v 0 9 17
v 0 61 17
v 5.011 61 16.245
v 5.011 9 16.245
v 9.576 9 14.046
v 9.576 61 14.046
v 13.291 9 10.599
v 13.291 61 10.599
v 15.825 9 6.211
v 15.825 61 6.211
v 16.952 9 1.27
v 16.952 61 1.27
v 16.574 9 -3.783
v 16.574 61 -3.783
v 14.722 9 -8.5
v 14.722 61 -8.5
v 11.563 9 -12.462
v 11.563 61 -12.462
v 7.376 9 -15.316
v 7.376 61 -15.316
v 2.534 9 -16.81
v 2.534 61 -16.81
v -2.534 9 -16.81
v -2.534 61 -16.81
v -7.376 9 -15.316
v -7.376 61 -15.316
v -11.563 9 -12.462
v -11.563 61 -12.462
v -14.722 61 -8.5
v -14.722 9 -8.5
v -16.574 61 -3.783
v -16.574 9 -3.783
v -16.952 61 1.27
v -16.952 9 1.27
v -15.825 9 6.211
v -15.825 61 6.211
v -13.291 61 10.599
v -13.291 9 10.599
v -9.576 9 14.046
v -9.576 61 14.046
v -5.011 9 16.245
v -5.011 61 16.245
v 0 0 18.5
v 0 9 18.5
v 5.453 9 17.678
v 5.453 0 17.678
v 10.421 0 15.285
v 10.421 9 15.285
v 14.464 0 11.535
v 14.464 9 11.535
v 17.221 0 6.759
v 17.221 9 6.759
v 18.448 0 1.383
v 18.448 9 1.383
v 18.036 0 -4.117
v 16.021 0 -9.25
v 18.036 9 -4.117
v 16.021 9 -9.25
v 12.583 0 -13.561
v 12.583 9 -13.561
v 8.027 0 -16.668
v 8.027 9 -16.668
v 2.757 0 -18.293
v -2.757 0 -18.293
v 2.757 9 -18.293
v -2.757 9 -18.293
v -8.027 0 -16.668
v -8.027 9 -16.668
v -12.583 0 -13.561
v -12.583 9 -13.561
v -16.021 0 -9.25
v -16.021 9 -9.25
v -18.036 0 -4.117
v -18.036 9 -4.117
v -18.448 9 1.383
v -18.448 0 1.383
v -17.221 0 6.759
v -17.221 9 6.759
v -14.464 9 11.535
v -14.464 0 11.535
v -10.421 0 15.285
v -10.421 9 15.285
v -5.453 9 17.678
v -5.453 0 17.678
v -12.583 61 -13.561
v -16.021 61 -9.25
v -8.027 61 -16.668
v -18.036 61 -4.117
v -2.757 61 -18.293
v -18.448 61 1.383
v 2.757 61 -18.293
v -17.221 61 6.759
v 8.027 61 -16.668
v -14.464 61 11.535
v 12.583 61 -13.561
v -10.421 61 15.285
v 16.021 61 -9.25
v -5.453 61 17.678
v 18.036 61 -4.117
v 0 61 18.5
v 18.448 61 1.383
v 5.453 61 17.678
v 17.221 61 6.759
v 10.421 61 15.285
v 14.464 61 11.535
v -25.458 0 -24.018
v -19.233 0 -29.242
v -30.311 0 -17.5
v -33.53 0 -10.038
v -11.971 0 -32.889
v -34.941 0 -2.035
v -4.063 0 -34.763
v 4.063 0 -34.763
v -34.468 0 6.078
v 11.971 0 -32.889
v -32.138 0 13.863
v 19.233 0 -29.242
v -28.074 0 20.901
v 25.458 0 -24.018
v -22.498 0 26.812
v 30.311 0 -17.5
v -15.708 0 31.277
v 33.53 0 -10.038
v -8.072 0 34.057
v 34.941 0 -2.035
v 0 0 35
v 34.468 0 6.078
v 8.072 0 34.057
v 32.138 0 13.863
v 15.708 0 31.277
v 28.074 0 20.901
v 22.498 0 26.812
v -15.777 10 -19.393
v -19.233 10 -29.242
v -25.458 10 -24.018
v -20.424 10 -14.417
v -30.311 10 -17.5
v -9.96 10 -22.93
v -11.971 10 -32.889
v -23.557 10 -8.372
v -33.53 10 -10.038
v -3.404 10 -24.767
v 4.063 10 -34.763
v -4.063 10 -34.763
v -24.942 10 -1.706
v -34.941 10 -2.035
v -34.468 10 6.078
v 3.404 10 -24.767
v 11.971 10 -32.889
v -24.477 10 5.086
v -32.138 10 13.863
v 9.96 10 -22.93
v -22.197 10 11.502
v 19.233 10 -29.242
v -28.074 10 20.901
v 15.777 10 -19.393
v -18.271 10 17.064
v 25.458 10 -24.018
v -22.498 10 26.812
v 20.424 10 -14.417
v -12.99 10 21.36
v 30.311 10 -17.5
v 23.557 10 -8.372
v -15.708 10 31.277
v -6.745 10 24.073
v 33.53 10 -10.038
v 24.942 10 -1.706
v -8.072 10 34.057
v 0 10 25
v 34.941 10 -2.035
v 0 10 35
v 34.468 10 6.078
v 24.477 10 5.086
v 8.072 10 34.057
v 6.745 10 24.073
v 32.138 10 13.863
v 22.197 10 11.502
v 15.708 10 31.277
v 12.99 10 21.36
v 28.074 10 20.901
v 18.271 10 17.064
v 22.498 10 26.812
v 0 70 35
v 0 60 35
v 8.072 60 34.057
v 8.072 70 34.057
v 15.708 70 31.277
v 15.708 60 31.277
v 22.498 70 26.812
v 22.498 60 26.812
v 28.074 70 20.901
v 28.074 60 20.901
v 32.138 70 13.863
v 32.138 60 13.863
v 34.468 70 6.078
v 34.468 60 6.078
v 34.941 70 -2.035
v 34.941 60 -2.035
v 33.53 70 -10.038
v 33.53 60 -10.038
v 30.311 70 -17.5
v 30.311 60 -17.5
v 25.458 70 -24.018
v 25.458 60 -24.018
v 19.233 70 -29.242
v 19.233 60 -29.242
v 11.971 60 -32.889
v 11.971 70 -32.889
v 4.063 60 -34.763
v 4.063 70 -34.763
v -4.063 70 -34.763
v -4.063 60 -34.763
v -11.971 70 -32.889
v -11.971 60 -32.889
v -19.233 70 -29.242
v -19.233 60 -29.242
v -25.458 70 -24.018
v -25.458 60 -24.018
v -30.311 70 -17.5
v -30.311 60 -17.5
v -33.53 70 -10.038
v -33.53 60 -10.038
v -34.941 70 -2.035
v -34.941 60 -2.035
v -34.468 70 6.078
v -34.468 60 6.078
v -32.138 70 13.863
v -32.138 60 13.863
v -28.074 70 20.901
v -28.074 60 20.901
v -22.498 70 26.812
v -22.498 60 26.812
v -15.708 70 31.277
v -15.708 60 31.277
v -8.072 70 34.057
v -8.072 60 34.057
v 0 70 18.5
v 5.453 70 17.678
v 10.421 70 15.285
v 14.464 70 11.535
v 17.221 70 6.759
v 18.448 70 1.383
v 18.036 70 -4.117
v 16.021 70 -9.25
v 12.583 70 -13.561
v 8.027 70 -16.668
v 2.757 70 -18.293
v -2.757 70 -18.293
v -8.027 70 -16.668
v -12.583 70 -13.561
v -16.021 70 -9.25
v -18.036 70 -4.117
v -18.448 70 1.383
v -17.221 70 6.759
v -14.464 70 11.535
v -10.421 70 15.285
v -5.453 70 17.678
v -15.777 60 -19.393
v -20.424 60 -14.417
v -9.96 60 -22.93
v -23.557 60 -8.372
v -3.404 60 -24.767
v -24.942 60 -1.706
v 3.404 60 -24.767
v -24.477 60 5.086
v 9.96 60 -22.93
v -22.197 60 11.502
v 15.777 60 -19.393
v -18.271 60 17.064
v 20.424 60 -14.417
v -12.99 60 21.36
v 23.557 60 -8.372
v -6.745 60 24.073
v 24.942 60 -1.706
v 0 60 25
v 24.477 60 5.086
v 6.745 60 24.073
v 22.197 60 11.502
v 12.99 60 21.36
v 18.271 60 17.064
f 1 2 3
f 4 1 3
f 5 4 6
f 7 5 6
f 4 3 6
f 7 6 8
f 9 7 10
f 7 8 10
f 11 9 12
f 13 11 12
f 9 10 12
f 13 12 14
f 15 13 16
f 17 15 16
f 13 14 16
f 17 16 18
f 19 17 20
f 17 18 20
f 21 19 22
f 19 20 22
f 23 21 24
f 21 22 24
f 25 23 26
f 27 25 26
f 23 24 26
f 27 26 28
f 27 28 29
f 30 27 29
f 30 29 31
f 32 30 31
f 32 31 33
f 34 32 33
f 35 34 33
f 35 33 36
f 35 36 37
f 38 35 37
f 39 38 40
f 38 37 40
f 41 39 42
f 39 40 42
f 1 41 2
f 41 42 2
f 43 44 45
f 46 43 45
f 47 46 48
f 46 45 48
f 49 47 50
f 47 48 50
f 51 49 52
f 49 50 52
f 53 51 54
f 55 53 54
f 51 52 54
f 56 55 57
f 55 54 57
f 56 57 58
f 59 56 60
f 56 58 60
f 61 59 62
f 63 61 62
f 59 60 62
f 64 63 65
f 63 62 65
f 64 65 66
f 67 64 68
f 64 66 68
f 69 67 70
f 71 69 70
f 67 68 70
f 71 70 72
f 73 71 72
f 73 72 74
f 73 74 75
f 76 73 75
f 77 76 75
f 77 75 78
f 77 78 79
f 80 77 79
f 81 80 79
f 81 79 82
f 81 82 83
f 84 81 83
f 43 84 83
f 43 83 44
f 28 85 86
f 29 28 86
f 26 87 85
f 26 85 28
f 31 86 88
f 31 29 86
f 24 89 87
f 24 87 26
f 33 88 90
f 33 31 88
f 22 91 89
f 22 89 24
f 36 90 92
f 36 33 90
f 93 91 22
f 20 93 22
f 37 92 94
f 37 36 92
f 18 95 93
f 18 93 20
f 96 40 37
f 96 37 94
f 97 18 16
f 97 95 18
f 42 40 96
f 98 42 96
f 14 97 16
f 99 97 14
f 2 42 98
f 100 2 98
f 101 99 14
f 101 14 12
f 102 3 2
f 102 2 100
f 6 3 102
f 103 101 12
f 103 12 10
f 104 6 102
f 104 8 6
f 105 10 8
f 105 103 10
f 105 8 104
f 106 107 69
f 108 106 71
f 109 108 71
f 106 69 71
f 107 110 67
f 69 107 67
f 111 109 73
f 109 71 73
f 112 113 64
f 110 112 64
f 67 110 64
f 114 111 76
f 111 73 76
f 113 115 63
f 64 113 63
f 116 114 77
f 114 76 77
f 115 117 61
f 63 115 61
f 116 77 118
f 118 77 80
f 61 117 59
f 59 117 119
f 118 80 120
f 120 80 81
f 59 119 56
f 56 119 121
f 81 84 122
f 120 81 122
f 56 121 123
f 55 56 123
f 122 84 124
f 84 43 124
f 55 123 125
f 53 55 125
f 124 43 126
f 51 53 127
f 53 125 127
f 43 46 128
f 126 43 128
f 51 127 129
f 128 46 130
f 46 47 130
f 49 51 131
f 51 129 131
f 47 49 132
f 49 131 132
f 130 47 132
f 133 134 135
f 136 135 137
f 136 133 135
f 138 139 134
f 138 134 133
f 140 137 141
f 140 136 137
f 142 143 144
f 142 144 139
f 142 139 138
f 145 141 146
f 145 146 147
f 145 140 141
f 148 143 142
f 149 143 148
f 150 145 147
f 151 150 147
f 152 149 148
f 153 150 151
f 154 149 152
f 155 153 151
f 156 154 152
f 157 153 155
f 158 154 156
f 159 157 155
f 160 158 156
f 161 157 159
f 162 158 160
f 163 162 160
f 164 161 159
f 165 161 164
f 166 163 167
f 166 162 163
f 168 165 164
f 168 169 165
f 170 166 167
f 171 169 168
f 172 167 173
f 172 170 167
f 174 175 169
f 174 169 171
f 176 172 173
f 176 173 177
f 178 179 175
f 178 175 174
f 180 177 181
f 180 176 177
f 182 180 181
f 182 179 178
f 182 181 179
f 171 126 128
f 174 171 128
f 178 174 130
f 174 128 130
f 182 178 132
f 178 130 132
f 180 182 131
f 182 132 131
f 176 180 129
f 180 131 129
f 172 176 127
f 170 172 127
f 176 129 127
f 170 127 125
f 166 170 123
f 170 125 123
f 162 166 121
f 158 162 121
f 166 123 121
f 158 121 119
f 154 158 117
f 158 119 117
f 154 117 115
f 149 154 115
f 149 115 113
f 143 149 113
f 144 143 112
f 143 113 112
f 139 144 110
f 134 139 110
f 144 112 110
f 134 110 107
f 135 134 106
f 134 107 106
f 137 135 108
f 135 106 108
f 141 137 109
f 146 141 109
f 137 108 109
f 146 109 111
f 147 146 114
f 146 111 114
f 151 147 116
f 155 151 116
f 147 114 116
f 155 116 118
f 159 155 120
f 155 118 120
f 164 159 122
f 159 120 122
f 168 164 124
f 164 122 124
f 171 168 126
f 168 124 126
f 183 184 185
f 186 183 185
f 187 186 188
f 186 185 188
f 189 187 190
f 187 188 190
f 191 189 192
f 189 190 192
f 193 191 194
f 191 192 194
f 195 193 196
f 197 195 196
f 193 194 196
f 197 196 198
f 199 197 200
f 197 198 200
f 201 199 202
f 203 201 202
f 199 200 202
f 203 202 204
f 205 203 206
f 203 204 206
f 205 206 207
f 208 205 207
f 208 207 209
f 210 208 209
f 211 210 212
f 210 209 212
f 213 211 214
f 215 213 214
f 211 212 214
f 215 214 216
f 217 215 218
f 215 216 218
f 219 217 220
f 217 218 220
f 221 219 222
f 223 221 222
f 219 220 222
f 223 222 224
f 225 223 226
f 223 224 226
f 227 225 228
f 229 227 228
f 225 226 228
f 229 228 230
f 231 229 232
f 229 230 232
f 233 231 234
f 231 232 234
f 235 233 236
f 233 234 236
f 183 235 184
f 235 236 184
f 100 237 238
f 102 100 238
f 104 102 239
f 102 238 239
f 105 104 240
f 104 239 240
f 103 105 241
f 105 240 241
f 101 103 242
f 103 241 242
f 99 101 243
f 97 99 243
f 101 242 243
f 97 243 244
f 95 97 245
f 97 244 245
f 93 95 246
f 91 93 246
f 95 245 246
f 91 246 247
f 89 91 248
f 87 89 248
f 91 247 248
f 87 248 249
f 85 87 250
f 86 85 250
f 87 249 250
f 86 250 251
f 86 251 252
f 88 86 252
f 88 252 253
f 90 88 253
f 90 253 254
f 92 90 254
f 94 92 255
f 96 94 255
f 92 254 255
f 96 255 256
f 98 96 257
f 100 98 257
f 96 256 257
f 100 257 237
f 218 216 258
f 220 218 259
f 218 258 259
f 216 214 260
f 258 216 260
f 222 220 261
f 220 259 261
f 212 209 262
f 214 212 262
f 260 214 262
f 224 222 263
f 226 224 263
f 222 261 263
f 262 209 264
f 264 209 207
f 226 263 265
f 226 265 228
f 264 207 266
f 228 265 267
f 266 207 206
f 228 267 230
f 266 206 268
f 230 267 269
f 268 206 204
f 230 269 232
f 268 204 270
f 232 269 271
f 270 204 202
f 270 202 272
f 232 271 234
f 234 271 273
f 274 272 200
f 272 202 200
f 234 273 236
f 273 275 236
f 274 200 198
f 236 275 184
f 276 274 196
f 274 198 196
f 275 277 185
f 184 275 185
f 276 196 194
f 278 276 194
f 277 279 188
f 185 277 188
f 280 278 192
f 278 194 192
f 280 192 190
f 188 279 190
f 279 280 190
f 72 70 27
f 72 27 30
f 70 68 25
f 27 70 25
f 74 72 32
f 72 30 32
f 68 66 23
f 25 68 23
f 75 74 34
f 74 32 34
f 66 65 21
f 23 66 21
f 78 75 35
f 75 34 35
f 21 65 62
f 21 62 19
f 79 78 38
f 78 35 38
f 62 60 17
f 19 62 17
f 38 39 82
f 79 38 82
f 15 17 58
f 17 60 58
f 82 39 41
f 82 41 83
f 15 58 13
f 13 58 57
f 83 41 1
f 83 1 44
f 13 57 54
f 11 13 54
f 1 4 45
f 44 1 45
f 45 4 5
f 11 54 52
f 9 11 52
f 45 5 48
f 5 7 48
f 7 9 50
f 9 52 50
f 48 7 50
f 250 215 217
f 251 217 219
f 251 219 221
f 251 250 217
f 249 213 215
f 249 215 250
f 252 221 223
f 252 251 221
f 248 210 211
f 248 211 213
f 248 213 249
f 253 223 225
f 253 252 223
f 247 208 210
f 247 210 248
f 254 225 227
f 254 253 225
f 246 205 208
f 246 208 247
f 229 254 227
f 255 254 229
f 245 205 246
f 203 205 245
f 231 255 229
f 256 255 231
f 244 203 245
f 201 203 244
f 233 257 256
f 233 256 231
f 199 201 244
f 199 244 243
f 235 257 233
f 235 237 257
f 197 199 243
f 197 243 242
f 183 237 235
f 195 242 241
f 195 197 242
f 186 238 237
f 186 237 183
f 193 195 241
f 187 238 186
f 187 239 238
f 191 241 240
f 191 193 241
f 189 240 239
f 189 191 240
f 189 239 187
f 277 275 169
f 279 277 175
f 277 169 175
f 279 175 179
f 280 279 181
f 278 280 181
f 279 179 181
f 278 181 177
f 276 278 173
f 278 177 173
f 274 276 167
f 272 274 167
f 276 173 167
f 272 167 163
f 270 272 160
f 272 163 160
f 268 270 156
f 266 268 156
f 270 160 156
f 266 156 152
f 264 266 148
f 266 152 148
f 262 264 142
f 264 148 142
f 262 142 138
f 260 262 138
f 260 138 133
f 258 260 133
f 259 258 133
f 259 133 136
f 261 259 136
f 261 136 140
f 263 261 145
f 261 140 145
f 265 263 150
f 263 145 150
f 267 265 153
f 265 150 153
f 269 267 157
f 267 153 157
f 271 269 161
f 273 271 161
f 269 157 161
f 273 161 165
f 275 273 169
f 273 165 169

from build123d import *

# Parameters (mm, degrees)
SKETCH_1_R          = 35
EXTRUDE_1_DEPTH     = 10
SKETCH_5_R          = 25
EXTRUDE_2_DEPTH     = 50
SKETCH_6_R          = 35
EXTRUDE_3_DEPTH     = 10
SKETCH_7_R          = 18.5
CUT_EXTRUDE_1_DEPTH = 9
SKETCH_8_R          = 17
CUT_EXTRUDE_2_DEPTH = 52
SKETCH_9_R          = 18.5
CUT_EXTRUDE_3_DEPTH = 79.555712714


with BuildPart() as part:
    # 草图1 → 凸台-拉伸1 (new body)
    with BuildSketch(Plane(origin=(0, 0, 0), x_dir=(1, 0, 0), z_dir=(0, 1, 0))):
        with Locations(Location((0, 0, 0), (0, 0, 270))):
            Circle(SKETCH_1_R)
    extrude(amount=EXTRUDE_1_DEPTH)

    # 草图5 → 凸台-拉伸2 (add)
    with BuildSketch(Plane(origin=(0, 10, 0), x_dir=(1, 0, 0), z_dir=(0, 1, 0))):
        with Locations(Location((0, 0, 0), (0, 0, 270))):
            Circle(SKETCH_5_R)
    extrude(amount=EXTRUDE_2_DEPTH)

    # 草图6 → 凸台-拉伸3 (add)
    with BuildSketch(Plane(origin=(0, 60, 0), x_dir=(1, 0, 0), z_dir=(0, 1, 0))):
        with Locations(Location((0, 0, 0), (0, 0, 270))):
            Circle(SKETCH_6_R)
    extrude(amount=EXTRUDE_3_DEPTH)

    # 草图7 → 切除-拉伸1 (cut)
    with BuildSketch(Plane(origin=(0, 70, 0), x_dir=(1, 0, 0), z_dir=(0, 1, 0))):
        with Locations(Location((0, 0, 0), (0, 0, 270))):
            Circle(SKETCH_7_R)
    extrude(amount=-CUT_EXTRUDE_1_DEPTH, mode=Mode.SUBTRACT)

    # 草图8 → 切除-拉伸2 (cut)
    with BuildSketch(Plane(origin=(0, 61, 0), x_dir=(1, 0, 0), z_dir=(0, 1, 0))):
        with Locations(Location((0, 0, 0), (0, 0, 270))):
            Circle(SKETCH_8_R)
    extrude(amount=-CUT_EXTRUDE_2_DEPTH, mode=Mode.SUBTRACT)

    # 草图9 → 切除-拉伸3 (cut, through all)
    with BuildSketch(Plane(origin=(0, 9, 0), x_dir=(1, 0, 0), z_dir=(0, 1, 0))):
        with Locations(Location((0, 0, 0), (0, 0, 270))):
            Circle(SKETCH_9_R)
    extrude(amount=-CUT_EXTRUDE_3_DEPTH, mode=Mode.SUBTRACT)


solid = part.part
